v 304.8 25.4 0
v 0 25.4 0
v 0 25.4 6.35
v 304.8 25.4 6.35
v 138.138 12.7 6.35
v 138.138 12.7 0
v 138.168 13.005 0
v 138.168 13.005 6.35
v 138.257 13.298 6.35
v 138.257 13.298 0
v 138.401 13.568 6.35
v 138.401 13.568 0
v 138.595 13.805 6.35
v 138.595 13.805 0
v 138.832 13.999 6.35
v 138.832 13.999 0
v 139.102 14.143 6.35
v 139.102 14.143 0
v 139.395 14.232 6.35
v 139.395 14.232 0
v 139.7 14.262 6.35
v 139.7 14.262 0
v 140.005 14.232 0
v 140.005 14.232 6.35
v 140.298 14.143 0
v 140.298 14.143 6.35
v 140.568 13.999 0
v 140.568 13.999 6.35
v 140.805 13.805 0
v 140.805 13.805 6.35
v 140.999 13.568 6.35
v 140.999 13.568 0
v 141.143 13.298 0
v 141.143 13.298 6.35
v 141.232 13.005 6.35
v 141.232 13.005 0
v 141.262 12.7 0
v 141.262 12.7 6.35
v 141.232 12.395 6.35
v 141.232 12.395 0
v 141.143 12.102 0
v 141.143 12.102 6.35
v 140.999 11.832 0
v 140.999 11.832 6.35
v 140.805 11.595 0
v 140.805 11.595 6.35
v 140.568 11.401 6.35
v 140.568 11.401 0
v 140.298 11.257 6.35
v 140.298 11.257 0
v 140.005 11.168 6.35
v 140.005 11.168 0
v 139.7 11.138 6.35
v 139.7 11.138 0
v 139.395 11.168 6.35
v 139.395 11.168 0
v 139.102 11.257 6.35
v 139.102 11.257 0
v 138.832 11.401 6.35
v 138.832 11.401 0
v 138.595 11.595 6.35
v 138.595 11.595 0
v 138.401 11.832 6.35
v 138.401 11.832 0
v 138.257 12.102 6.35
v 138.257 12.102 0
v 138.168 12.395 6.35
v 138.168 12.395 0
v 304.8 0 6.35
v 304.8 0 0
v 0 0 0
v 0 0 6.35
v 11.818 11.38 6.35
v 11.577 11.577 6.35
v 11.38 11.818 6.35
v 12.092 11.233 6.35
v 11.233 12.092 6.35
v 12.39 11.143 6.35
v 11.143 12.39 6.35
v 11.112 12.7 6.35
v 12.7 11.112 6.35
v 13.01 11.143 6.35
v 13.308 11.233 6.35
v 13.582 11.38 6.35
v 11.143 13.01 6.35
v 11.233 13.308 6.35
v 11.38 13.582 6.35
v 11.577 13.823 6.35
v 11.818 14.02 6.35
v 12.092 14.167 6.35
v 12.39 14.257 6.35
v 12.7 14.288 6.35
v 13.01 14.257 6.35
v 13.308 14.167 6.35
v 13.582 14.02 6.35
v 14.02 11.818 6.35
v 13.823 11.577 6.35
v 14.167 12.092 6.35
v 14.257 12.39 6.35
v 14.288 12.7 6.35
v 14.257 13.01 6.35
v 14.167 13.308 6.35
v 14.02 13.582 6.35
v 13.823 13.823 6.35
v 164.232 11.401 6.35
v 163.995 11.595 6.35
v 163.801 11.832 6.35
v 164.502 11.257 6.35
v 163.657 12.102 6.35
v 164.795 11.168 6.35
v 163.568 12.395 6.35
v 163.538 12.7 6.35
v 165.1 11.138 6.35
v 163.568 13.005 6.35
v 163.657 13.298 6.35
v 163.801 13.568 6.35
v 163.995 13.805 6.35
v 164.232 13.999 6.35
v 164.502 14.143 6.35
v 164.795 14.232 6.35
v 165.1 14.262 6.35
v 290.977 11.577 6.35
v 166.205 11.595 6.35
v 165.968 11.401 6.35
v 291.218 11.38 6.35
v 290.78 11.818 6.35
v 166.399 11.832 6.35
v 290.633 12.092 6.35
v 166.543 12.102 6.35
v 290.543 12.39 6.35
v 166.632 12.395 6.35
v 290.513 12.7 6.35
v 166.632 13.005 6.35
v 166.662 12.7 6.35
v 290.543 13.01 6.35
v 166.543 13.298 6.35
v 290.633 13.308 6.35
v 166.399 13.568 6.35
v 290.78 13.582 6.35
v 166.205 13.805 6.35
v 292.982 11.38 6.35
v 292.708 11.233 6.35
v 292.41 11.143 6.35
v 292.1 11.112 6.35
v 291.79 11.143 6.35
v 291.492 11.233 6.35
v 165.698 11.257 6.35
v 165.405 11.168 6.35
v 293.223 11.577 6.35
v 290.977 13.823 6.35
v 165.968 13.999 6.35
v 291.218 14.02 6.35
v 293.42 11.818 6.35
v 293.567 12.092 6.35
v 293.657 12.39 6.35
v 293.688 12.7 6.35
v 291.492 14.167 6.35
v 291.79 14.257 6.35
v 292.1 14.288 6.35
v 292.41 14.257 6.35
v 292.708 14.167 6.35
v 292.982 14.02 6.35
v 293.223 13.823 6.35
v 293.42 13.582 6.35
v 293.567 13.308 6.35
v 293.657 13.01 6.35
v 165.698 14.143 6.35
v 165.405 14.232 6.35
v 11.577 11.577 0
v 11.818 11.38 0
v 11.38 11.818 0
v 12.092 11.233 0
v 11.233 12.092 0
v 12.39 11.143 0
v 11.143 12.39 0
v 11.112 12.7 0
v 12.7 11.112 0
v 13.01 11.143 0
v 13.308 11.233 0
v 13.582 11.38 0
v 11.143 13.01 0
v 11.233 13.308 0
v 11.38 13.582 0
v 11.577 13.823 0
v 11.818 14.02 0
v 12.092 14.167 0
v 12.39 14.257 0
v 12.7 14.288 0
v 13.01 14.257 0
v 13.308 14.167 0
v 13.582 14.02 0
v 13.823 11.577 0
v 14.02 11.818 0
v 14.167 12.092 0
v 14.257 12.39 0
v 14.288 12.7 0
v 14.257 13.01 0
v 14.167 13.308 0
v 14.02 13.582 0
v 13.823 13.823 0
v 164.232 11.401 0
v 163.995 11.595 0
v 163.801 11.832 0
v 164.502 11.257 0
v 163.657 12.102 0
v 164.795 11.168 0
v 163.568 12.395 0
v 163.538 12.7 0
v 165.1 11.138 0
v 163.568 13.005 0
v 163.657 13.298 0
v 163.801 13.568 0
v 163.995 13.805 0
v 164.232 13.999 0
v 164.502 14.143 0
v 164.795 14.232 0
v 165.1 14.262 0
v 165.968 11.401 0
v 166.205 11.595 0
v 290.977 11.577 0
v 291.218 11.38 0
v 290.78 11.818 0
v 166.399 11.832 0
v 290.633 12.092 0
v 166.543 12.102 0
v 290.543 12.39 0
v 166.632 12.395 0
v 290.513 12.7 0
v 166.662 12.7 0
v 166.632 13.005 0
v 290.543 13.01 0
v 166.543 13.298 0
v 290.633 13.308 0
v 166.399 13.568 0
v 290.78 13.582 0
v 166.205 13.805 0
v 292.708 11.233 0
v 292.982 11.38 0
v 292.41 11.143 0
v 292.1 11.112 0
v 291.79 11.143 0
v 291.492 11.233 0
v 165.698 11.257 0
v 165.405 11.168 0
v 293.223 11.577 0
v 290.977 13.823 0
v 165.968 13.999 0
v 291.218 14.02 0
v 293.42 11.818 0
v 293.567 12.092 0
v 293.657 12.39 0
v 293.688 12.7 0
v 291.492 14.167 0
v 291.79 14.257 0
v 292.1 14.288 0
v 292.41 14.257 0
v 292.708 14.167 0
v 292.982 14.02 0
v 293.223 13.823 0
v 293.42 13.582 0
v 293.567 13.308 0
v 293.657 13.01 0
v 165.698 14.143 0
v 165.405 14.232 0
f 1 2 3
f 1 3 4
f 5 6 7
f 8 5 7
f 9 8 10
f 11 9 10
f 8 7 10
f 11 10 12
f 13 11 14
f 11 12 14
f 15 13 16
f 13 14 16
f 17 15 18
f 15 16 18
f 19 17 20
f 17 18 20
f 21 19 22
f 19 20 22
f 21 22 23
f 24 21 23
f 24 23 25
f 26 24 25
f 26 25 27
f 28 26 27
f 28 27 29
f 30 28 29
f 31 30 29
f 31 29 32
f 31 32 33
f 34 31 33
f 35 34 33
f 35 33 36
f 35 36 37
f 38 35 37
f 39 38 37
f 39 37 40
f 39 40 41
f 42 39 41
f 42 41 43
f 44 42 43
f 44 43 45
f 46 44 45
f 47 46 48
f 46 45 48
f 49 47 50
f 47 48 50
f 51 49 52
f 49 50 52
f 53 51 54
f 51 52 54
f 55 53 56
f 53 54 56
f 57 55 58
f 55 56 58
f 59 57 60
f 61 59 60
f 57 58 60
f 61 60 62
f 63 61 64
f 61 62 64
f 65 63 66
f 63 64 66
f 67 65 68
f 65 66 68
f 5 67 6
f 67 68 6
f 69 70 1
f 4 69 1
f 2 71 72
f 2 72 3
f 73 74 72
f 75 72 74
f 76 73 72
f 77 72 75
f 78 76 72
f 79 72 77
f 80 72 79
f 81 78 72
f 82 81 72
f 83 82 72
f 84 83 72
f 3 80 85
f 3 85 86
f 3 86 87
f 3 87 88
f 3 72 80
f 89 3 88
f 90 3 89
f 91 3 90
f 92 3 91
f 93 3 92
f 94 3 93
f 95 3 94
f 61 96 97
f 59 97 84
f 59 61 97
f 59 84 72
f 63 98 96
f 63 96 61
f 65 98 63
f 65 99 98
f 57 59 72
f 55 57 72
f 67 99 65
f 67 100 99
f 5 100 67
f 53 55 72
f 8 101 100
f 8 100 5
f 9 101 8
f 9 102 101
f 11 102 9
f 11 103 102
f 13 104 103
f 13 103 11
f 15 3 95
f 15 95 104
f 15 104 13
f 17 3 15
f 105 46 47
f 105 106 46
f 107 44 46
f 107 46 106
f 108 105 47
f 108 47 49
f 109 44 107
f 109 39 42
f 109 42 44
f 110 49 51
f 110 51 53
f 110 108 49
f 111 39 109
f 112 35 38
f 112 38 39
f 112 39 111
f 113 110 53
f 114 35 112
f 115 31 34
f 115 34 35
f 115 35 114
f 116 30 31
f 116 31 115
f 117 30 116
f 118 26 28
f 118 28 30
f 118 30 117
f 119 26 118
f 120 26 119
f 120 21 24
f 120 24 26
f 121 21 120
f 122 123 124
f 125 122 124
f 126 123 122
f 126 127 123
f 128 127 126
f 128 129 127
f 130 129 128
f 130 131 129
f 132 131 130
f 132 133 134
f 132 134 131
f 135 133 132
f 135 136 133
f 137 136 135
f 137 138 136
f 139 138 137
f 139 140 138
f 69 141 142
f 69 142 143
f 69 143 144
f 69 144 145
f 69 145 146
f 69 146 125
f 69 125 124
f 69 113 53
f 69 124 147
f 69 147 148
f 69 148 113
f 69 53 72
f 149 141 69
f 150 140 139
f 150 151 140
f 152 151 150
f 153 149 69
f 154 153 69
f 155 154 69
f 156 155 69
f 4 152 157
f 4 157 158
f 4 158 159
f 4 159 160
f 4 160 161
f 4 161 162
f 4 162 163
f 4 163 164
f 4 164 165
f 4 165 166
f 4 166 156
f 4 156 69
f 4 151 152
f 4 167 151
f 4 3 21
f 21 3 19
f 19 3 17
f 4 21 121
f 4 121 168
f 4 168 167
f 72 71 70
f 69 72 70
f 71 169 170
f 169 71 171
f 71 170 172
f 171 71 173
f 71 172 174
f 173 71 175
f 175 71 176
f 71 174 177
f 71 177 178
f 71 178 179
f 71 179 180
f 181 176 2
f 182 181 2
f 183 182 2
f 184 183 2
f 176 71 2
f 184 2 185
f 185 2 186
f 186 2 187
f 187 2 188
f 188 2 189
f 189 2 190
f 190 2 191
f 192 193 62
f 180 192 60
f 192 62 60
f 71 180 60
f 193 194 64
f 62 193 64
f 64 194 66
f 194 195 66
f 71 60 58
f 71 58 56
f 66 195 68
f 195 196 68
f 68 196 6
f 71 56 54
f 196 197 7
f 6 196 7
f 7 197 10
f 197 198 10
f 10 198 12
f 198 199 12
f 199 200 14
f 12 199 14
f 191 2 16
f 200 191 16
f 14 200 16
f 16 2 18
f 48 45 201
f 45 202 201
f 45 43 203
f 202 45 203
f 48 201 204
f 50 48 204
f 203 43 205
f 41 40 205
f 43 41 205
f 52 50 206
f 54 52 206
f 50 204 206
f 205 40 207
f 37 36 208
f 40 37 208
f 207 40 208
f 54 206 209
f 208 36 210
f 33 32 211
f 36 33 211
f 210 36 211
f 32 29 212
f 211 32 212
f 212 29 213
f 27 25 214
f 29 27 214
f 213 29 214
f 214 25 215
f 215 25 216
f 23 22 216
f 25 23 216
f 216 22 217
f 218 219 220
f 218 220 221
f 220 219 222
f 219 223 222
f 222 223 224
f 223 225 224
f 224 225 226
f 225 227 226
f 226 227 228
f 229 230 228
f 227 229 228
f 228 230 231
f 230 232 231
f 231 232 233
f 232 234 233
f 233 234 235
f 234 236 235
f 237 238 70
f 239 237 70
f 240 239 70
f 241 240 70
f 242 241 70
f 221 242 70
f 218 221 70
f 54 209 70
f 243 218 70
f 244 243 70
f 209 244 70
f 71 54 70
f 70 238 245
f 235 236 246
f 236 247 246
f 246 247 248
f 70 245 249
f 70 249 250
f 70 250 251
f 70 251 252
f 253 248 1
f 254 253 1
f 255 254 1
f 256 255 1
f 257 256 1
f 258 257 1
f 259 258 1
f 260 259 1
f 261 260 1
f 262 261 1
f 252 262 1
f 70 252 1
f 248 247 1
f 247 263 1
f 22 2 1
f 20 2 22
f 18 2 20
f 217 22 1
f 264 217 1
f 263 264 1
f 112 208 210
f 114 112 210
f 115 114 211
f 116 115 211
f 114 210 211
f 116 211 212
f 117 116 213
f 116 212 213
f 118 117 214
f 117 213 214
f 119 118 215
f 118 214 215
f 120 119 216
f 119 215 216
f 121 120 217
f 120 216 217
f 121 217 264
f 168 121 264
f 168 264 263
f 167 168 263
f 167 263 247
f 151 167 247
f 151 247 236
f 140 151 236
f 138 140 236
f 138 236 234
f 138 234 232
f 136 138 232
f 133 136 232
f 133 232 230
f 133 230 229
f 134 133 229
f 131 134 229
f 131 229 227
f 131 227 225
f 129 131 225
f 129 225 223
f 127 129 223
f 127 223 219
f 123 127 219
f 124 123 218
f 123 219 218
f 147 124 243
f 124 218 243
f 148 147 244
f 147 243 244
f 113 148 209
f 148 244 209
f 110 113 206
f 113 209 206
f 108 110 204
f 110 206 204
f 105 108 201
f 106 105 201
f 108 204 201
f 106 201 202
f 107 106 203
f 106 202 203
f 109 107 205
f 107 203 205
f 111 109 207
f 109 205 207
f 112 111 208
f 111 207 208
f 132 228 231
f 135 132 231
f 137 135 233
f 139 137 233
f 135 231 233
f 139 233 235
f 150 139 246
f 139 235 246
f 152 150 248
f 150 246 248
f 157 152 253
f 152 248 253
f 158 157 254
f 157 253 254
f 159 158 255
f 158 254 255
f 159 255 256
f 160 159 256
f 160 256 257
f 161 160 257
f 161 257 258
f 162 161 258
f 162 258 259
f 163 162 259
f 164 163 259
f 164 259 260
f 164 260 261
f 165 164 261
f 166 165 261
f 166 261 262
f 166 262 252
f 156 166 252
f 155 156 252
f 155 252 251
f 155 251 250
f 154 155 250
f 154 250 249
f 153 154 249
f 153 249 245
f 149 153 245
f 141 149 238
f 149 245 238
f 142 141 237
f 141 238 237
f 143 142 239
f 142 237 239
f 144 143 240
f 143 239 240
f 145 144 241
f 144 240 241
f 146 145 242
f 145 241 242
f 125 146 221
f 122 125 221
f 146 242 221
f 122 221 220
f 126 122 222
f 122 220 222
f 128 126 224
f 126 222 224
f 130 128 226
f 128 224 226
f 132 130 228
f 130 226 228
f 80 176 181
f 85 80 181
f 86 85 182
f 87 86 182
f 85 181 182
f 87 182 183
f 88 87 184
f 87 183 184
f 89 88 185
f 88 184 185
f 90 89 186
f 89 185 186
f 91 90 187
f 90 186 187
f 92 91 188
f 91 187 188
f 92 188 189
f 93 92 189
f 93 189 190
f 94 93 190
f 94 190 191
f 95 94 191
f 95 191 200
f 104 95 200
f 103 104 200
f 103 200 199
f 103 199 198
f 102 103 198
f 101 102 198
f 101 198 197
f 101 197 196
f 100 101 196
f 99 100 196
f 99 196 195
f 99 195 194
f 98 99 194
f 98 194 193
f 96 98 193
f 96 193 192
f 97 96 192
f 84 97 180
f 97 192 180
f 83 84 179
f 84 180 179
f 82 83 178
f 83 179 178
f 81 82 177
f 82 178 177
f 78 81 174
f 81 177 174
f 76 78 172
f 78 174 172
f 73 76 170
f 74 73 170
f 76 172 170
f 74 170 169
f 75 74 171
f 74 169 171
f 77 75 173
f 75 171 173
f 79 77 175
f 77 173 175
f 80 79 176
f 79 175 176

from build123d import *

# Parameters (mm, degrees)
F0_W     = 304.8
F0_H     = 25.4
F1_DEPTH = 6.35
F3_D     = 3.1242
F5_D     = 3.175


with BuildPart() as f1:
    # F0 (on Top) → F1 (new body)
    with BuildSketch(Plane.XY):
        with Locations((152.4, 12.7)):
            Rectangle(F0_W, F0_H)
    extrude(amount=F1_DEPTH)

    # F3 (through all)
    with Locations(Plane.XY.offset(6.35)):
        with Locations((139.7, 12.7), (165.1, 12.7)):
            Hole(F3_D / 2)

    # F5 (through all)
    with Locations(Plane.XY.offset(6.35)):
        with Locations((12.7, 12.7), (292.1, 12.7)):
            Hole(F5_D / 2)


solid = f1.part
